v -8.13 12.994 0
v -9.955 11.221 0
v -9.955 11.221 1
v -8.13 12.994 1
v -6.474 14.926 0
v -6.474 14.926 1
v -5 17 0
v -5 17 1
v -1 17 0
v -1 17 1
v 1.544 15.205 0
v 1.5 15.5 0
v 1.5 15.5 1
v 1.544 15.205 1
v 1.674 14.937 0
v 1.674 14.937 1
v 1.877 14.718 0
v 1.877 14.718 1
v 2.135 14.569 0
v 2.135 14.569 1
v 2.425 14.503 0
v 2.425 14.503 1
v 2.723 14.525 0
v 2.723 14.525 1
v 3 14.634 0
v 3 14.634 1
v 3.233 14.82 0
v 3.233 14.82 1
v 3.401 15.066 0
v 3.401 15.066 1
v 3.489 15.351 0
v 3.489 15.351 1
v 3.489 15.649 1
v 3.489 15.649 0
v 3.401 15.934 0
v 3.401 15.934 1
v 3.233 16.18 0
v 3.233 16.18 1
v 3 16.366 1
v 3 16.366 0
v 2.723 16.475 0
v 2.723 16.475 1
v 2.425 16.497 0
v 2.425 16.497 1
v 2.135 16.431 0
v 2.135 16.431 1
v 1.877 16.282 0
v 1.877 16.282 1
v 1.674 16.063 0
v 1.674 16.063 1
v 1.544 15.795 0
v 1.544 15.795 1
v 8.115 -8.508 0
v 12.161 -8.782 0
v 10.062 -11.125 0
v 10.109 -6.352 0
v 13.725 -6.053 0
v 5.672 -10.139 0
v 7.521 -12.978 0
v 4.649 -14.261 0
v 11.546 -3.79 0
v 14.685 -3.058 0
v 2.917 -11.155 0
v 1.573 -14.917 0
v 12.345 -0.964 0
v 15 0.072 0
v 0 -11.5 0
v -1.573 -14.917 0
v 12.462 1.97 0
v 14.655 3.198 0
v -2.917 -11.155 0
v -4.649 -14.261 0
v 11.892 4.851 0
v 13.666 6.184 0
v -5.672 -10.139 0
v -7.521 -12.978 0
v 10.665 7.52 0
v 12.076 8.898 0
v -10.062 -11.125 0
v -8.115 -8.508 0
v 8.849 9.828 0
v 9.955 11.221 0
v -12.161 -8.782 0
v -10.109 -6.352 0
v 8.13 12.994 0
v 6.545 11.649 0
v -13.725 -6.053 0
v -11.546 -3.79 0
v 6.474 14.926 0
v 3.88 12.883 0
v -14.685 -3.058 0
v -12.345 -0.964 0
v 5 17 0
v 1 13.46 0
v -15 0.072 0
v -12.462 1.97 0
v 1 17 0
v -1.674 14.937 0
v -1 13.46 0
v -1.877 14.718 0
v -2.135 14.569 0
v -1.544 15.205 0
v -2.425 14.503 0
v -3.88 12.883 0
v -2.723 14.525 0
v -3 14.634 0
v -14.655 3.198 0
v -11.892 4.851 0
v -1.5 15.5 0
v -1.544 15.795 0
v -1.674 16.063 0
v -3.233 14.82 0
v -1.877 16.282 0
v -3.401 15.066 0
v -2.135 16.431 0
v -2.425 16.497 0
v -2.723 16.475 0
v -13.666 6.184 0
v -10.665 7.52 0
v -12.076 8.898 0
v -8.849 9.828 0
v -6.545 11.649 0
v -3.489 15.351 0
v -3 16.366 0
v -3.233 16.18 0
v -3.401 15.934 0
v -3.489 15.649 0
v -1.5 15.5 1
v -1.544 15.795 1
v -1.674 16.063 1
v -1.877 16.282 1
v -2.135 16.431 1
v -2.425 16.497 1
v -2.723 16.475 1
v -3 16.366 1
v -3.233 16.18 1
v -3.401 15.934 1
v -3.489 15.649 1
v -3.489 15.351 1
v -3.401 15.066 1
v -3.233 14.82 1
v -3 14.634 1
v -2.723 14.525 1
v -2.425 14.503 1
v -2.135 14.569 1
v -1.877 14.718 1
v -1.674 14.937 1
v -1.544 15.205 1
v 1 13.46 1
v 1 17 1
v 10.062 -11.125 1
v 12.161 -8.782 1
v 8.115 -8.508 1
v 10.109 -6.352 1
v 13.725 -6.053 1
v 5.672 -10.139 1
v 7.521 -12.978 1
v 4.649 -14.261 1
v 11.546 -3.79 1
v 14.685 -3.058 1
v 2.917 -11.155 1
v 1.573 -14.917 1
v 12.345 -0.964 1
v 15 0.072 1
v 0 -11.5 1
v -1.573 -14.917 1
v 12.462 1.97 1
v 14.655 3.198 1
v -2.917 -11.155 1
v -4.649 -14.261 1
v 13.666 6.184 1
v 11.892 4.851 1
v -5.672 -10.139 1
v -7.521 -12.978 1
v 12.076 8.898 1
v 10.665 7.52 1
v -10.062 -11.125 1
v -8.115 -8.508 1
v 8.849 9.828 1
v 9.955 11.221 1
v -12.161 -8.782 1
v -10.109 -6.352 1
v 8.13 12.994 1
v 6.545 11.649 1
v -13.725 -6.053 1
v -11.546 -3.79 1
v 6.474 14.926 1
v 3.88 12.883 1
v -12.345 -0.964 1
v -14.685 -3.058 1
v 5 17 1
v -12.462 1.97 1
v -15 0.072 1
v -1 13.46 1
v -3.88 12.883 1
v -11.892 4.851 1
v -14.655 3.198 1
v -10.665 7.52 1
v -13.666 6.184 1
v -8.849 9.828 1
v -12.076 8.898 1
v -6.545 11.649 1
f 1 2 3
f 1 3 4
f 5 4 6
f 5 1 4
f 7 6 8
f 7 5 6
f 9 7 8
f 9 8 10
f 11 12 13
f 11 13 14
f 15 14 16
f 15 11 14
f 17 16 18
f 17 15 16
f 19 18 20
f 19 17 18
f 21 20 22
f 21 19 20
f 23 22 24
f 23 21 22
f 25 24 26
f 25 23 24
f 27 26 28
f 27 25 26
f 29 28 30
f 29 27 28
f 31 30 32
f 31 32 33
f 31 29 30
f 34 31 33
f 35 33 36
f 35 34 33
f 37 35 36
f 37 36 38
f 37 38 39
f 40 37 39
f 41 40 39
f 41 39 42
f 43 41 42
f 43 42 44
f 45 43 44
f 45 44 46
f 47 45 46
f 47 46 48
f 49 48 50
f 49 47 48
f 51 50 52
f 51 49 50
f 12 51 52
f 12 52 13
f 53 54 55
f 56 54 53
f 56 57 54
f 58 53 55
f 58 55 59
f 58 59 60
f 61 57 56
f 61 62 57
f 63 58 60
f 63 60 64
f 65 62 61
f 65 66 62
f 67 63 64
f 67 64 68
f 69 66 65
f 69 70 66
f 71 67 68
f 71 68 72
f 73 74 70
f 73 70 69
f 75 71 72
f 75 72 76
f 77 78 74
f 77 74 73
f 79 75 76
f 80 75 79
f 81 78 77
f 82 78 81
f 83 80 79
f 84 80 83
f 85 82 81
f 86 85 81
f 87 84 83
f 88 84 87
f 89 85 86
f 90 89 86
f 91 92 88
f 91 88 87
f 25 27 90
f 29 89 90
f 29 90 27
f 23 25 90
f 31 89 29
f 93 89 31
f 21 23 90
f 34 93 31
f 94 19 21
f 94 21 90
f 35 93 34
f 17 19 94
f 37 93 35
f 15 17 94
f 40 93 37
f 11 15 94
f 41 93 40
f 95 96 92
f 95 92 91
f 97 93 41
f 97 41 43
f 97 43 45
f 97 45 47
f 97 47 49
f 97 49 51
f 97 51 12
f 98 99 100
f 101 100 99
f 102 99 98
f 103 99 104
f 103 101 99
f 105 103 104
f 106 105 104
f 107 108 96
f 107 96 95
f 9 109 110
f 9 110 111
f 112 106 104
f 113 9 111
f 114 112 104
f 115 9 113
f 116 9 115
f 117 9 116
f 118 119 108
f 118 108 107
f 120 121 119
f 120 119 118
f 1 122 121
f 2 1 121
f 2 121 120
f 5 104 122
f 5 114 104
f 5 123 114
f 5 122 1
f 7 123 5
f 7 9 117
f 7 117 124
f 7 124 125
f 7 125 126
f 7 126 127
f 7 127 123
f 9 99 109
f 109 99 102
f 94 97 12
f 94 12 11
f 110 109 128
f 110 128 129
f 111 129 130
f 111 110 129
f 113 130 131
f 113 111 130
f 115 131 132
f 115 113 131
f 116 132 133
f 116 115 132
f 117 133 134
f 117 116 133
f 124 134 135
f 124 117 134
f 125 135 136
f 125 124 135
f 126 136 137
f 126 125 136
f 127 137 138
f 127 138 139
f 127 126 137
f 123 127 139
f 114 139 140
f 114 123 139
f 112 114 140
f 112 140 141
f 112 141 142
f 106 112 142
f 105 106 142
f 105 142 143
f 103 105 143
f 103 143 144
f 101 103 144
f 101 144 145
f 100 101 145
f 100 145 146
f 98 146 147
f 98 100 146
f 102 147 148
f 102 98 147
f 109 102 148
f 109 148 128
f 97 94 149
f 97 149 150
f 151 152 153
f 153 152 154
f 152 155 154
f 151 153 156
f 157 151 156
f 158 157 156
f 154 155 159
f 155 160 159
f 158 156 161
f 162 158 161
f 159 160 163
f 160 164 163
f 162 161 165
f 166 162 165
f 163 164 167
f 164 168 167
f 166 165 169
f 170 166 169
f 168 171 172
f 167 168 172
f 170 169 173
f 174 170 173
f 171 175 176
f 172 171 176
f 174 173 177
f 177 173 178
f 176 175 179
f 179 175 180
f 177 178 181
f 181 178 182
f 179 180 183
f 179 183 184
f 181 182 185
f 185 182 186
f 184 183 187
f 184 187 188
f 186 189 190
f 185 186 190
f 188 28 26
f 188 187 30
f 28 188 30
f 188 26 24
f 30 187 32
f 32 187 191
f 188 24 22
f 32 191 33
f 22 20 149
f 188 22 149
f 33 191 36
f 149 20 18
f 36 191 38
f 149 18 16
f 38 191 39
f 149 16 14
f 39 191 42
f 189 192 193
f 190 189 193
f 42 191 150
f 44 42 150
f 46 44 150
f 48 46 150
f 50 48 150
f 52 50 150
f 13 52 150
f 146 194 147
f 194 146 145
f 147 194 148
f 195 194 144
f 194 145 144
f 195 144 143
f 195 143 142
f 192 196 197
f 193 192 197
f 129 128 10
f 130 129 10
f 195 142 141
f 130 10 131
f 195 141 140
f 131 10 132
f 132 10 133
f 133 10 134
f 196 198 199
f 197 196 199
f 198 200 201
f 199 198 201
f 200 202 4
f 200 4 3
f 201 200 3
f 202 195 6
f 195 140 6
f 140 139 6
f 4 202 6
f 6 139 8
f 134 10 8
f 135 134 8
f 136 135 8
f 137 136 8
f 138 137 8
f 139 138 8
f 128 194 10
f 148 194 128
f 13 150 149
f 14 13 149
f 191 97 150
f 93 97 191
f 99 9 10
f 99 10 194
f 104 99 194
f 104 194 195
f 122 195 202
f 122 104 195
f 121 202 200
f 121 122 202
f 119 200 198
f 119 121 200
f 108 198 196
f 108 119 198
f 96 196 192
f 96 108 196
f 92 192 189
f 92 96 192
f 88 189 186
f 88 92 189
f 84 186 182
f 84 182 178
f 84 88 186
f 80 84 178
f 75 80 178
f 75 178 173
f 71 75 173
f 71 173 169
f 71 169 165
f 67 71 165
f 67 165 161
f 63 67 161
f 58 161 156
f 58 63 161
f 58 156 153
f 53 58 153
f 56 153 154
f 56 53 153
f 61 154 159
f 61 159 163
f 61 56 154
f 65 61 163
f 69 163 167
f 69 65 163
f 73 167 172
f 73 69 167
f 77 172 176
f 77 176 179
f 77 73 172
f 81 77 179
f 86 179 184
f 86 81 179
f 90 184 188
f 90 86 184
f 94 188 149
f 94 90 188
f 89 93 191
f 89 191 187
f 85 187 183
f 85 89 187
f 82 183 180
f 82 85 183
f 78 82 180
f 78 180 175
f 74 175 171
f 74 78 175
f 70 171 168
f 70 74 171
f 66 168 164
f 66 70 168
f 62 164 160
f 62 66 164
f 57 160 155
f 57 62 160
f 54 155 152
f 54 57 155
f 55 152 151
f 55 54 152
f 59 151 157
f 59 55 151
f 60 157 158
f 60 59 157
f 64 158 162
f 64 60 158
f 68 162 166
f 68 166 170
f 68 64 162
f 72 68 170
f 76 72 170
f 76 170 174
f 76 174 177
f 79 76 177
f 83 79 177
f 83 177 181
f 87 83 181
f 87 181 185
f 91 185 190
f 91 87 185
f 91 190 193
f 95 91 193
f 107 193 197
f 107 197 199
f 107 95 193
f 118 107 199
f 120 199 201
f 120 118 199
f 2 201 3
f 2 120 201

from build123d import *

# Parameters (mm, degrees)
SKETCH1_R           = 1
BOSS_EXTRUDE1_DEPTH = 1


with BuildPart() as part:
    # Sketch1 → Boss-Extrude1 (new body)
    with BuildSketch(Plane.XY):
        with BuildLine():
            Line((-5, 17), (-1, 17))
            Line((-1, 17), (-1, 13.459935794))
            ThreePointArc((-1, 13.459935794), (0, -11.5), (1, 13.459935794))
            Line((1, 13.459935794), (1, 17))
            Line((1, 17), (5, 17))
            ThreePointArc((5, 17), (7.280116529, 13.941078138), (9.954900605, 11.22051487))
            ThreePointArc((9.954900605, 11.22051487), (0, -15), (-9.954900605, 11.22051487))
            ThreePointArc((-9.954900605, 11.22051487), (-7.280116529, 13.941078138), (-5, 17))
        make_face()
        with Locations((-2.5, 15.5)):
            Circle(SKETCH1_R, mode=Mode.SUBTRACT)
        with Locations(Location((2.5, 15.5, 0), (0, 0, 180))):
            Circle(SKETCH1_R, mode=Mode.SUBTRACT)
    extrude(amount=BOSS_EXTRUDE1_DEPTH)


solid = part.part
